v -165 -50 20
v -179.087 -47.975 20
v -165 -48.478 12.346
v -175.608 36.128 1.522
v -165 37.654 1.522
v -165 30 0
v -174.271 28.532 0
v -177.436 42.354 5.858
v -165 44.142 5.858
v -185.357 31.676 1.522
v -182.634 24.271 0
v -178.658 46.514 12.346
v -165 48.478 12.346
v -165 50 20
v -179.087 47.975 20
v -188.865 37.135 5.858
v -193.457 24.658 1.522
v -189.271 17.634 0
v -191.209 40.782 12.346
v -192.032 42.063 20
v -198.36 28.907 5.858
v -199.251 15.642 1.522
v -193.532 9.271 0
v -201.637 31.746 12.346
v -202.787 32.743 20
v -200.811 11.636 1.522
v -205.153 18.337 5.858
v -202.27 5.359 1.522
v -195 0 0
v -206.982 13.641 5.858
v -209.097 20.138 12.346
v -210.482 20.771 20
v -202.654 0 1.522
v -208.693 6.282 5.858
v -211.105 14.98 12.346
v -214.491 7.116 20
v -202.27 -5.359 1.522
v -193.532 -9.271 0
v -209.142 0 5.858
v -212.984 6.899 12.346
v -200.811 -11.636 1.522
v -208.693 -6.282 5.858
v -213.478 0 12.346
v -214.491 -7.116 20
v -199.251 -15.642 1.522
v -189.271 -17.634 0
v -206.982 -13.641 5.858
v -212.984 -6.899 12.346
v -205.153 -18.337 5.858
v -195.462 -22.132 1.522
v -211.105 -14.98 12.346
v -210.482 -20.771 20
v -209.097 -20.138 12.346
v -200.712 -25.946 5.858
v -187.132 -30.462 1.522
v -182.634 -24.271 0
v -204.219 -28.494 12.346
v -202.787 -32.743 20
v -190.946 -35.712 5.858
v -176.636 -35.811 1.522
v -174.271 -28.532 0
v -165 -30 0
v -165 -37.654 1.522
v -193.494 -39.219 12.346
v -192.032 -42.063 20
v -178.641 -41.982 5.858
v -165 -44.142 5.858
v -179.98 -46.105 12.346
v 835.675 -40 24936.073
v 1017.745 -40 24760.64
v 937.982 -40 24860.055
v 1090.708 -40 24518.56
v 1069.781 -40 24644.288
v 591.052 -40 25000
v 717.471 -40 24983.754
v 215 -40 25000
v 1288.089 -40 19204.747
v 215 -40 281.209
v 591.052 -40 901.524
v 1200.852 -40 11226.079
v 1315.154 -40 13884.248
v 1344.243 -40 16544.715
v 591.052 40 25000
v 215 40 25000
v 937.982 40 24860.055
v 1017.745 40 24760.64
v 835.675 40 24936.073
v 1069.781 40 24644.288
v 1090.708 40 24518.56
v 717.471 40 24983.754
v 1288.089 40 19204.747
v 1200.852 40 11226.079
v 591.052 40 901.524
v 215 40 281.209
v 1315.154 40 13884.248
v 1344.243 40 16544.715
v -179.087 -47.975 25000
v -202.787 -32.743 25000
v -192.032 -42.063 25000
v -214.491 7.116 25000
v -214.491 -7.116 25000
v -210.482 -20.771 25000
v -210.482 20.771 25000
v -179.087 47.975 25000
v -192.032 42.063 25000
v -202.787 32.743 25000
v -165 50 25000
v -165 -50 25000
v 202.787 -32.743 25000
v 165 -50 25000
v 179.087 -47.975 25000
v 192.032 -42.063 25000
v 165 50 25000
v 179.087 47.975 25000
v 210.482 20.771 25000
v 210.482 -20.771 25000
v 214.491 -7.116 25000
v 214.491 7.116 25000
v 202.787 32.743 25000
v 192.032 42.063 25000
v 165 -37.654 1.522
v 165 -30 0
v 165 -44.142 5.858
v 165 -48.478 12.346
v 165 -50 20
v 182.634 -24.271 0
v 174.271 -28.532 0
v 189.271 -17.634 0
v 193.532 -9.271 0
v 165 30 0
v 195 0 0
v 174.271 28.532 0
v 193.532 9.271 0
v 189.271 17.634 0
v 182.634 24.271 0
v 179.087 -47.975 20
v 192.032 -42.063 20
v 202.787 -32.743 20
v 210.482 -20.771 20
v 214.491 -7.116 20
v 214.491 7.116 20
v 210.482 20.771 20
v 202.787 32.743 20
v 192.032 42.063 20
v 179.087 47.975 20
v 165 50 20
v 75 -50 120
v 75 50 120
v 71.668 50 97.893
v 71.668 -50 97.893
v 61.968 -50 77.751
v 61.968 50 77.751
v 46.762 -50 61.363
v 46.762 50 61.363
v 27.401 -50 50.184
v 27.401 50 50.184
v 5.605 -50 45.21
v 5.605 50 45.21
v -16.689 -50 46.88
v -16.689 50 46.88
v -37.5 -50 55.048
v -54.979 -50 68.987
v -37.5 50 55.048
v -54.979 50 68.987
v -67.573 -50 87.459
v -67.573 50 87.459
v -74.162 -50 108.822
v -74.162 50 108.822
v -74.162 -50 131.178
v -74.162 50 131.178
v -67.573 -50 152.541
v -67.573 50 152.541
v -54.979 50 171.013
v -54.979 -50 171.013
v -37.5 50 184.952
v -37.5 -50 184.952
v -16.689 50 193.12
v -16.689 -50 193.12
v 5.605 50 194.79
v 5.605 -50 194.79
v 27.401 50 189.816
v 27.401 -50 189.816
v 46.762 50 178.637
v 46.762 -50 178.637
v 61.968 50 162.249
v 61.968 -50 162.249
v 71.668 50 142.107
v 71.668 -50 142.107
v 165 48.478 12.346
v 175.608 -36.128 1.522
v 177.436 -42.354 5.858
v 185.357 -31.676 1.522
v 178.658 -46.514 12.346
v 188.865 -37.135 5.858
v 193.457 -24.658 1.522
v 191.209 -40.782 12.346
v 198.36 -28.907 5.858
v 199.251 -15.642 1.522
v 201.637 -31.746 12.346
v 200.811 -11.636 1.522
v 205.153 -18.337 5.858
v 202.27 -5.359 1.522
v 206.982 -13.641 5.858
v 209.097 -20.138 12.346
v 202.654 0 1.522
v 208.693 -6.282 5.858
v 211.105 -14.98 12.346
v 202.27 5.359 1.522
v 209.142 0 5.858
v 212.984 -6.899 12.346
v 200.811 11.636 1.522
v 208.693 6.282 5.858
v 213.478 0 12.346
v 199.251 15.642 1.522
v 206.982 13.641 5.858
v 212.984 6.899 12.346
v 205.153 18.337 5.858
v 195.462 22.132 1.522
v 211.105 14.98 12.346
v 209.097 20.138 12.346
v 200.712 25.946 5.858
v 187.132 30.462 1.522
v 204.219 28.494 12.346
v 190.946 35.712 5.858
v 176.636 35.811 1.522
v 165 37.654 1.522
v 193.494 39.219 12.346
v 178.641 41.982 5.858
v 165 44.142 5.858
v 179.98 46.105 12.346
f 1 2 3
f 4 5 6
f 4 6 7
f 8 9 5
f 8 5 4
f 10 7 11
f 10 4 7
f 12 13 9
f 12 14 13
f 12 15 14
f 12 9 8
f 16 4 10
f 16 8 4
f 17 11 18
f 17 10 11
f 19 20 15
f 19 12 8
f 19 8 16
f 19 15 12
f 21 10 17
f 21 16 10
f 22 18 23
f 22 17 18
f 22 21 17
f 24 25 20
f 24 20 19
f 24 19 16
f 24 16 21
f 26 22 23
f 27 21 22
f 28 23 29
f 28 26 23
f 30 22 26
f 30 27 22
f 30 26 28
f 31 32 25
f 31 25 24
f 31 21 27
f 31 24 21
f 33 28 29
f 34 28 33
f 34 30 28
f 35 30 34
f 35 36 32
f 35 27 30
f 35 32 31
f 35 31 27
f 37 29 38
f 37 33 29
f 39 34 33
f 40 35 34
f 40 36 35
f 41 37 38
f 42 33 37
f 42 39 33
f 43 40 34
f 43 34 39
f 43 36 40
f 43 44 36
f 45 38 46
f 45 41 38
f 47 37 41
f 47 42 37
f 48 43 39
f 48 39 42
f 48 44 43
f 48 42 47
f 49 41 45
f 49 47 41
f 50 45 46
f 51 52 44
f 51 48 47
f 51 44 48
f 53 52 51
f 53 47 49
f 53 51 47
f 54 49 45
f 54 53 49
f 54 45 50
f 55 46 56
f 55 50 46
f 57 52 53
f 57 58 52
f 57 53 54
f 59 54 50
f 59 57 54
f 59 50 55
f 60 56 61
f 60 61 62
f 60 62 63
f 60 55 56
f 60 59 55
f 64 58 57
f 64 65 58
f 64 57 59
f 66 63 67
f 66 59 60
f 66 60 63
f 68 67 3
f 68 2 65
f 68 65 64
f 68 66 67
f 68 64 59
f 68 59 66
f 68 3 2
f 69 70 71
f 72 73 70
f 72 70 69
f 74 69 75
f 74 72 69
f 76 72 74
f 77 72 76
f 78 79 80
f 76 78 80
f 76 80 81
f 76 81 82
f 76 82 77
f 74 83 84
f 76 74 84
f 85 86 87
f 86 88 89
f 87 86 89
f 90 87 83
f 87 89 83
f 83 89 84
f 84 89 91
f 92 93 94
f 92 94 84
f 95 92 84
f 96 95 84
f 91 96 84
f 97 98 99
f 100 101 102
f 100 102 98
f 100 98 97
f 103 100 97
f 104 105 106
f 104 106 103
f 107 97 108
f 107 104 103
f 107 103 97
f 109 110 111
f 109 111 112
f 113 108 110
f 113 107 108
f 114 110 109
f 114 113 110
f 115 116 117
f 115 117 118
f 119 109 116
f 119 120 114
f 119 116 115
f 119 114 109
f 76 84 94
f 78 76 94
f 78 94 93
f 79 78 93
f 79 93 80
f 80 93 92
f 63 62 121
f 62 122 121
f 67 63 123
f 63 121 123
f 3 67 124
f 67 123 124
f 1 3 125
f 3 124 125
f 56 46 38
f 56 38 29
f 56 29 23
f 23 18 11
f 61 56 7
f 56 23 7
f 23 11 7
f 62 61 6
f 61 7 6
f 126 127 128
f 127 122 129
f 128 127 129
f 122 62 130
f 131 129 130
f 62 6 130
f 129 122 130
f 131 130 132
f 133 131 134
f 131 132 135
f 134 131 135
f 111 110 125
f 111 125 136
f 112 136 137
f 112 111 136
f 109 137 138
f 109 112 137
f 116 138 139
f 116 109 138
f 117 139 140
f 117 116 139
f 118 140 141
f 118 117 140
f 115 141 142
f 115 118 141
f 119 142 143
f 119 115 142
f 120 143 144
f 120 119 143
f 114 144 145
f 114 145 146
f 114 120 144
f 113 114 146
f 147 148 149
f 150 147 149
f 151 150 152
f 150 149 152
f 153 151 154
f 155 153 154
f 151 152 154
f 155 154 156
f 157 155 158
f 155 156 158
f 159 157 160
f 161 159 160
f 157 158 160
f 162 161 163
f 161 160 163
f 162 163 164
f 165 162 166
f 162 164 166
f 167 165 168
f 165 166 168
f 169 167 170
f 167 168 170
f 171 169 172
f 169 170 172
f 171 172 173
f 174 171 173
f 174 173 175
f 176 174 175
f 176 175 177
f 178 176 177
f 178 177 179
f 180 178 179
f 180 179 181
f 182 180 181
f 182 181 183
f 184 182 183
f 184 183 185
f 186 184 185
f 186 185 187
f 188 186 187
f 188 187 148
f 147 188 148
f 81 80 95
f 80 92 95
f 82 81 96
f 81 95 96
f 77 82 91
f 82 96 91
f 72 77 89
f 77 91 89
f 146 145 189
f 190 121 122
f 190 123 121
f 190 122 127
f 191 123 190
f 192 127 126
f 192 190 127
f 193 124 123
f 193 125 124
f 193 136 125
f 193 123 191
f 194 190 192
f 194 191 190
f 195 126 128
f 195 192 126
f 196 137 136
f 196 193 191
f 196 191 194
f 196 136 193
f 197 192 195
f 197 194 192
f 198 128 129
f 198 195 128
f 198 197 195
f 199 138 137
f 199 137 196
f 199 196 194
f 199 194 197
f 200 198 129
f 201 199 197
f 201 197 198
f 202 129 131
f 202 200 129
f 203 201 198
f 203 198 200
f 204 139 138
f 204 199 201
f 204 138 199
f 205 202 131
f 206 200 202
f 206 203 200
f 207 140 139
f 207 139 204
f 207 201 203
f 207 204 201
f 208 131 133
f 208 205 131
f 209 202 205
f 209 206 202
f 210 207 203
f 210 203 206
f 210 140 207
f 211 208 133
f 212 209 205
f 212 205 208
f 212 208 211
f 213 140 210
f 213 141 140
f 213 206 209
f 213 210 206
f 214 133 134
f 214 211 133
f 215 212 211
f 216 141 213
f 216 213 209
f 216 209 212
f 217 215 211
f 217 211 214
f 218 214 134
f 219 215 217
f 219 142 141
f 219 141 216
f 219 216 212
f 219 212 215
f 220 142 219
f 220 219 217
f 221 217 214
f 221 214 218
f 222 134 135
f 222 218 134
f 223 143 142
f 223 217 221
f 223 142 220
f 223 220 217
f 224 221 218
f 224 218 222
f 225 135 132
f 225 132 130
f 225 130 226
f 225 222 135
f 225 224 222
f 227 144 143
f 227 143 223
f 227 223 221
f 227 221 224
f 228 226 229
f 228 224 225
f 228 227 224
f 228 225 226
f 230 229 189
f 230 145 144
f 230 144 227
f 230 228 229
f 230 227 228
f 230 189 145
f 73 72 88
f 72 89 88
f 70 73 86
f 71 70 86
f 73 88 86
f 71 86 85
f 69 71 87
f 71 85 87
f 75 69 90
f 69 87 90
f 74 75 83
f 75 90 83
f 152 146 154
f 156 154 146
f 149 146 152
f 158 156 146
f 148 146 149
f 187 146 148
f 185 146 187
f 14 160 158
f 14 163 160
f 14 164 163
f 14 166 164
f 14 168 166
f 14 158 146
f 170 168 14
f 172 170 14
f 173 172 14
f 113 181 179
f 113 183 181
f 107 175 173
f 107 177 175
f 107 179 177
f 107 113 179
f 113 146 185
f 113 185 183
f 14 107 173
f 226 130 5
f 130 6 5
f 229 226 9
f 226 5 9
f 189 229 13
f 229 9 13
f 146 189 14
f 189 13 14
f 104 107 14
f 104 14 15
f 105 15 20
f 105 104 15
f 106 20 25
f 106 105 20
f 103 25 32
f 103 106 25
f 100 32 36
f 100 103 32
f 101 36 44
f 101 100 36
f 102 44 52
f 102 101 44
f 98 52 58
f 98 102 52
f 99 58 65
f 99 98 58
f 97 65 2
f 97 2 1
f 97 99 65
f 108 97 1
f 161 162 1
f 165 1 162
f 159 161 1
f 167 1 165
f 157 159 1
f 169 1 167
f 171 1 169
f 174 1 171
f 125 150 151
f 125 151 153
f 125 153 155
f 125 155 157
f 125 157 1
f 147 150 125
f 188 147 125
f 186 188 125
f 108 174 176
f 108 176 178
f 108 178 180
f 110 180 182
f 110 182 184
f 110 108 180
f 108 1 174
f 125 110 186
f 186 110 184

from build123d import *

# Parameters (mm, degrees)
SKETCH4_R                = 75
CUT_EXTRUDE1_DEPTH       = 101
FILLET1_R                = 20
BOSS_EXTRUDE1_DEPTH      = 40
BOSS_EXTRUDE1_DEPTH_BACK = 40


with BuildPart() as part:
    # Sweep1: sweep along a path in Sketch2
    with BuildLine(Plane(origin=(0, 0, 0), x_dir=(1, 0, 0), z_dir=(0, 1, 0))) as sweep1_path:
        Line((0, 0), (0, -25000))
    # Sketch1 → Sweep1 (sweep)
    with BuildSketch(Plane.XY):
        with BuildLine():
            Line((-165, 50), (165, 50))
            ThreePointArc((165, 50), (215, 0), (165, -50))
            Line((165, -50), (-165, -50))
            ThreePointArc((-165, -50), (-215, 0), (-165, 50))
        make_face()
    sweep(path=sweep1_path.line)

    # Sketch4 → Cut-Extrude1 (cut, through all)
    with BuildSketch(Plane(origin=(0, 50, 0), x_dir=(1, 0, 0), z_dir=(0, 1, 0))):
        with Locations((0, -120)):
            Circle(SKETCH4_R)
    extrude(amount=-CUT_EXTRUDE1_DEPTH, mode=Mode.SUBTRACT)

    # Fillet1
    fillet1_edges = [part.edges().sort_by_distance(p)[0] for p in [
        (-215, 0, 0),
        (0, -50, 0),
        (215, 0, 0),
        (0, 50, 0),
    ]]
    fillet(fillet1_edges, radius=FILLET1_R)


with BuildPart() as body_2:
    # Sketch3 → Boss-Extrude1 (new body, two sides)
    with BuildSketch(Plane(origin=(0, 0, 0), x_dir=(1, 0, 0), z_dir=(0, 1, 0))) as boss_extrude1_sk:
        with BuildLine():
            Line((215, -281.209140276), (591.052452888, -901.524429756))
            Line((591.052452888, -901.524429756), (1200.851543386, -11226.079055967))
            ThreePointArc((1200.851543386, -11226.079055967), (1340.354422594, -15214.36481836), (1288.088555363, -19204.747338236))
            Line((1288.088555363, -19204.747338236), (1090.707874725, -24518.559618227))
            ThreePointArc((1090.707874725, -24518.559618227), (937.98197807, -24860.05541873), (591.052452888, -25000))
            Line((591.052452888, -25000), (215, -25000))
            Line((215, -25000), (215, -281.209140276))
        make_face()
    extrude(amount=BOSS_EXTRUDE1_DEPTH)
    extrude(boss_extrude1_sk.sketch, amount=-BOSS_EXTRUDE1_DEPTH_BACK)


solid = Compound([part.part, body_2.part])
